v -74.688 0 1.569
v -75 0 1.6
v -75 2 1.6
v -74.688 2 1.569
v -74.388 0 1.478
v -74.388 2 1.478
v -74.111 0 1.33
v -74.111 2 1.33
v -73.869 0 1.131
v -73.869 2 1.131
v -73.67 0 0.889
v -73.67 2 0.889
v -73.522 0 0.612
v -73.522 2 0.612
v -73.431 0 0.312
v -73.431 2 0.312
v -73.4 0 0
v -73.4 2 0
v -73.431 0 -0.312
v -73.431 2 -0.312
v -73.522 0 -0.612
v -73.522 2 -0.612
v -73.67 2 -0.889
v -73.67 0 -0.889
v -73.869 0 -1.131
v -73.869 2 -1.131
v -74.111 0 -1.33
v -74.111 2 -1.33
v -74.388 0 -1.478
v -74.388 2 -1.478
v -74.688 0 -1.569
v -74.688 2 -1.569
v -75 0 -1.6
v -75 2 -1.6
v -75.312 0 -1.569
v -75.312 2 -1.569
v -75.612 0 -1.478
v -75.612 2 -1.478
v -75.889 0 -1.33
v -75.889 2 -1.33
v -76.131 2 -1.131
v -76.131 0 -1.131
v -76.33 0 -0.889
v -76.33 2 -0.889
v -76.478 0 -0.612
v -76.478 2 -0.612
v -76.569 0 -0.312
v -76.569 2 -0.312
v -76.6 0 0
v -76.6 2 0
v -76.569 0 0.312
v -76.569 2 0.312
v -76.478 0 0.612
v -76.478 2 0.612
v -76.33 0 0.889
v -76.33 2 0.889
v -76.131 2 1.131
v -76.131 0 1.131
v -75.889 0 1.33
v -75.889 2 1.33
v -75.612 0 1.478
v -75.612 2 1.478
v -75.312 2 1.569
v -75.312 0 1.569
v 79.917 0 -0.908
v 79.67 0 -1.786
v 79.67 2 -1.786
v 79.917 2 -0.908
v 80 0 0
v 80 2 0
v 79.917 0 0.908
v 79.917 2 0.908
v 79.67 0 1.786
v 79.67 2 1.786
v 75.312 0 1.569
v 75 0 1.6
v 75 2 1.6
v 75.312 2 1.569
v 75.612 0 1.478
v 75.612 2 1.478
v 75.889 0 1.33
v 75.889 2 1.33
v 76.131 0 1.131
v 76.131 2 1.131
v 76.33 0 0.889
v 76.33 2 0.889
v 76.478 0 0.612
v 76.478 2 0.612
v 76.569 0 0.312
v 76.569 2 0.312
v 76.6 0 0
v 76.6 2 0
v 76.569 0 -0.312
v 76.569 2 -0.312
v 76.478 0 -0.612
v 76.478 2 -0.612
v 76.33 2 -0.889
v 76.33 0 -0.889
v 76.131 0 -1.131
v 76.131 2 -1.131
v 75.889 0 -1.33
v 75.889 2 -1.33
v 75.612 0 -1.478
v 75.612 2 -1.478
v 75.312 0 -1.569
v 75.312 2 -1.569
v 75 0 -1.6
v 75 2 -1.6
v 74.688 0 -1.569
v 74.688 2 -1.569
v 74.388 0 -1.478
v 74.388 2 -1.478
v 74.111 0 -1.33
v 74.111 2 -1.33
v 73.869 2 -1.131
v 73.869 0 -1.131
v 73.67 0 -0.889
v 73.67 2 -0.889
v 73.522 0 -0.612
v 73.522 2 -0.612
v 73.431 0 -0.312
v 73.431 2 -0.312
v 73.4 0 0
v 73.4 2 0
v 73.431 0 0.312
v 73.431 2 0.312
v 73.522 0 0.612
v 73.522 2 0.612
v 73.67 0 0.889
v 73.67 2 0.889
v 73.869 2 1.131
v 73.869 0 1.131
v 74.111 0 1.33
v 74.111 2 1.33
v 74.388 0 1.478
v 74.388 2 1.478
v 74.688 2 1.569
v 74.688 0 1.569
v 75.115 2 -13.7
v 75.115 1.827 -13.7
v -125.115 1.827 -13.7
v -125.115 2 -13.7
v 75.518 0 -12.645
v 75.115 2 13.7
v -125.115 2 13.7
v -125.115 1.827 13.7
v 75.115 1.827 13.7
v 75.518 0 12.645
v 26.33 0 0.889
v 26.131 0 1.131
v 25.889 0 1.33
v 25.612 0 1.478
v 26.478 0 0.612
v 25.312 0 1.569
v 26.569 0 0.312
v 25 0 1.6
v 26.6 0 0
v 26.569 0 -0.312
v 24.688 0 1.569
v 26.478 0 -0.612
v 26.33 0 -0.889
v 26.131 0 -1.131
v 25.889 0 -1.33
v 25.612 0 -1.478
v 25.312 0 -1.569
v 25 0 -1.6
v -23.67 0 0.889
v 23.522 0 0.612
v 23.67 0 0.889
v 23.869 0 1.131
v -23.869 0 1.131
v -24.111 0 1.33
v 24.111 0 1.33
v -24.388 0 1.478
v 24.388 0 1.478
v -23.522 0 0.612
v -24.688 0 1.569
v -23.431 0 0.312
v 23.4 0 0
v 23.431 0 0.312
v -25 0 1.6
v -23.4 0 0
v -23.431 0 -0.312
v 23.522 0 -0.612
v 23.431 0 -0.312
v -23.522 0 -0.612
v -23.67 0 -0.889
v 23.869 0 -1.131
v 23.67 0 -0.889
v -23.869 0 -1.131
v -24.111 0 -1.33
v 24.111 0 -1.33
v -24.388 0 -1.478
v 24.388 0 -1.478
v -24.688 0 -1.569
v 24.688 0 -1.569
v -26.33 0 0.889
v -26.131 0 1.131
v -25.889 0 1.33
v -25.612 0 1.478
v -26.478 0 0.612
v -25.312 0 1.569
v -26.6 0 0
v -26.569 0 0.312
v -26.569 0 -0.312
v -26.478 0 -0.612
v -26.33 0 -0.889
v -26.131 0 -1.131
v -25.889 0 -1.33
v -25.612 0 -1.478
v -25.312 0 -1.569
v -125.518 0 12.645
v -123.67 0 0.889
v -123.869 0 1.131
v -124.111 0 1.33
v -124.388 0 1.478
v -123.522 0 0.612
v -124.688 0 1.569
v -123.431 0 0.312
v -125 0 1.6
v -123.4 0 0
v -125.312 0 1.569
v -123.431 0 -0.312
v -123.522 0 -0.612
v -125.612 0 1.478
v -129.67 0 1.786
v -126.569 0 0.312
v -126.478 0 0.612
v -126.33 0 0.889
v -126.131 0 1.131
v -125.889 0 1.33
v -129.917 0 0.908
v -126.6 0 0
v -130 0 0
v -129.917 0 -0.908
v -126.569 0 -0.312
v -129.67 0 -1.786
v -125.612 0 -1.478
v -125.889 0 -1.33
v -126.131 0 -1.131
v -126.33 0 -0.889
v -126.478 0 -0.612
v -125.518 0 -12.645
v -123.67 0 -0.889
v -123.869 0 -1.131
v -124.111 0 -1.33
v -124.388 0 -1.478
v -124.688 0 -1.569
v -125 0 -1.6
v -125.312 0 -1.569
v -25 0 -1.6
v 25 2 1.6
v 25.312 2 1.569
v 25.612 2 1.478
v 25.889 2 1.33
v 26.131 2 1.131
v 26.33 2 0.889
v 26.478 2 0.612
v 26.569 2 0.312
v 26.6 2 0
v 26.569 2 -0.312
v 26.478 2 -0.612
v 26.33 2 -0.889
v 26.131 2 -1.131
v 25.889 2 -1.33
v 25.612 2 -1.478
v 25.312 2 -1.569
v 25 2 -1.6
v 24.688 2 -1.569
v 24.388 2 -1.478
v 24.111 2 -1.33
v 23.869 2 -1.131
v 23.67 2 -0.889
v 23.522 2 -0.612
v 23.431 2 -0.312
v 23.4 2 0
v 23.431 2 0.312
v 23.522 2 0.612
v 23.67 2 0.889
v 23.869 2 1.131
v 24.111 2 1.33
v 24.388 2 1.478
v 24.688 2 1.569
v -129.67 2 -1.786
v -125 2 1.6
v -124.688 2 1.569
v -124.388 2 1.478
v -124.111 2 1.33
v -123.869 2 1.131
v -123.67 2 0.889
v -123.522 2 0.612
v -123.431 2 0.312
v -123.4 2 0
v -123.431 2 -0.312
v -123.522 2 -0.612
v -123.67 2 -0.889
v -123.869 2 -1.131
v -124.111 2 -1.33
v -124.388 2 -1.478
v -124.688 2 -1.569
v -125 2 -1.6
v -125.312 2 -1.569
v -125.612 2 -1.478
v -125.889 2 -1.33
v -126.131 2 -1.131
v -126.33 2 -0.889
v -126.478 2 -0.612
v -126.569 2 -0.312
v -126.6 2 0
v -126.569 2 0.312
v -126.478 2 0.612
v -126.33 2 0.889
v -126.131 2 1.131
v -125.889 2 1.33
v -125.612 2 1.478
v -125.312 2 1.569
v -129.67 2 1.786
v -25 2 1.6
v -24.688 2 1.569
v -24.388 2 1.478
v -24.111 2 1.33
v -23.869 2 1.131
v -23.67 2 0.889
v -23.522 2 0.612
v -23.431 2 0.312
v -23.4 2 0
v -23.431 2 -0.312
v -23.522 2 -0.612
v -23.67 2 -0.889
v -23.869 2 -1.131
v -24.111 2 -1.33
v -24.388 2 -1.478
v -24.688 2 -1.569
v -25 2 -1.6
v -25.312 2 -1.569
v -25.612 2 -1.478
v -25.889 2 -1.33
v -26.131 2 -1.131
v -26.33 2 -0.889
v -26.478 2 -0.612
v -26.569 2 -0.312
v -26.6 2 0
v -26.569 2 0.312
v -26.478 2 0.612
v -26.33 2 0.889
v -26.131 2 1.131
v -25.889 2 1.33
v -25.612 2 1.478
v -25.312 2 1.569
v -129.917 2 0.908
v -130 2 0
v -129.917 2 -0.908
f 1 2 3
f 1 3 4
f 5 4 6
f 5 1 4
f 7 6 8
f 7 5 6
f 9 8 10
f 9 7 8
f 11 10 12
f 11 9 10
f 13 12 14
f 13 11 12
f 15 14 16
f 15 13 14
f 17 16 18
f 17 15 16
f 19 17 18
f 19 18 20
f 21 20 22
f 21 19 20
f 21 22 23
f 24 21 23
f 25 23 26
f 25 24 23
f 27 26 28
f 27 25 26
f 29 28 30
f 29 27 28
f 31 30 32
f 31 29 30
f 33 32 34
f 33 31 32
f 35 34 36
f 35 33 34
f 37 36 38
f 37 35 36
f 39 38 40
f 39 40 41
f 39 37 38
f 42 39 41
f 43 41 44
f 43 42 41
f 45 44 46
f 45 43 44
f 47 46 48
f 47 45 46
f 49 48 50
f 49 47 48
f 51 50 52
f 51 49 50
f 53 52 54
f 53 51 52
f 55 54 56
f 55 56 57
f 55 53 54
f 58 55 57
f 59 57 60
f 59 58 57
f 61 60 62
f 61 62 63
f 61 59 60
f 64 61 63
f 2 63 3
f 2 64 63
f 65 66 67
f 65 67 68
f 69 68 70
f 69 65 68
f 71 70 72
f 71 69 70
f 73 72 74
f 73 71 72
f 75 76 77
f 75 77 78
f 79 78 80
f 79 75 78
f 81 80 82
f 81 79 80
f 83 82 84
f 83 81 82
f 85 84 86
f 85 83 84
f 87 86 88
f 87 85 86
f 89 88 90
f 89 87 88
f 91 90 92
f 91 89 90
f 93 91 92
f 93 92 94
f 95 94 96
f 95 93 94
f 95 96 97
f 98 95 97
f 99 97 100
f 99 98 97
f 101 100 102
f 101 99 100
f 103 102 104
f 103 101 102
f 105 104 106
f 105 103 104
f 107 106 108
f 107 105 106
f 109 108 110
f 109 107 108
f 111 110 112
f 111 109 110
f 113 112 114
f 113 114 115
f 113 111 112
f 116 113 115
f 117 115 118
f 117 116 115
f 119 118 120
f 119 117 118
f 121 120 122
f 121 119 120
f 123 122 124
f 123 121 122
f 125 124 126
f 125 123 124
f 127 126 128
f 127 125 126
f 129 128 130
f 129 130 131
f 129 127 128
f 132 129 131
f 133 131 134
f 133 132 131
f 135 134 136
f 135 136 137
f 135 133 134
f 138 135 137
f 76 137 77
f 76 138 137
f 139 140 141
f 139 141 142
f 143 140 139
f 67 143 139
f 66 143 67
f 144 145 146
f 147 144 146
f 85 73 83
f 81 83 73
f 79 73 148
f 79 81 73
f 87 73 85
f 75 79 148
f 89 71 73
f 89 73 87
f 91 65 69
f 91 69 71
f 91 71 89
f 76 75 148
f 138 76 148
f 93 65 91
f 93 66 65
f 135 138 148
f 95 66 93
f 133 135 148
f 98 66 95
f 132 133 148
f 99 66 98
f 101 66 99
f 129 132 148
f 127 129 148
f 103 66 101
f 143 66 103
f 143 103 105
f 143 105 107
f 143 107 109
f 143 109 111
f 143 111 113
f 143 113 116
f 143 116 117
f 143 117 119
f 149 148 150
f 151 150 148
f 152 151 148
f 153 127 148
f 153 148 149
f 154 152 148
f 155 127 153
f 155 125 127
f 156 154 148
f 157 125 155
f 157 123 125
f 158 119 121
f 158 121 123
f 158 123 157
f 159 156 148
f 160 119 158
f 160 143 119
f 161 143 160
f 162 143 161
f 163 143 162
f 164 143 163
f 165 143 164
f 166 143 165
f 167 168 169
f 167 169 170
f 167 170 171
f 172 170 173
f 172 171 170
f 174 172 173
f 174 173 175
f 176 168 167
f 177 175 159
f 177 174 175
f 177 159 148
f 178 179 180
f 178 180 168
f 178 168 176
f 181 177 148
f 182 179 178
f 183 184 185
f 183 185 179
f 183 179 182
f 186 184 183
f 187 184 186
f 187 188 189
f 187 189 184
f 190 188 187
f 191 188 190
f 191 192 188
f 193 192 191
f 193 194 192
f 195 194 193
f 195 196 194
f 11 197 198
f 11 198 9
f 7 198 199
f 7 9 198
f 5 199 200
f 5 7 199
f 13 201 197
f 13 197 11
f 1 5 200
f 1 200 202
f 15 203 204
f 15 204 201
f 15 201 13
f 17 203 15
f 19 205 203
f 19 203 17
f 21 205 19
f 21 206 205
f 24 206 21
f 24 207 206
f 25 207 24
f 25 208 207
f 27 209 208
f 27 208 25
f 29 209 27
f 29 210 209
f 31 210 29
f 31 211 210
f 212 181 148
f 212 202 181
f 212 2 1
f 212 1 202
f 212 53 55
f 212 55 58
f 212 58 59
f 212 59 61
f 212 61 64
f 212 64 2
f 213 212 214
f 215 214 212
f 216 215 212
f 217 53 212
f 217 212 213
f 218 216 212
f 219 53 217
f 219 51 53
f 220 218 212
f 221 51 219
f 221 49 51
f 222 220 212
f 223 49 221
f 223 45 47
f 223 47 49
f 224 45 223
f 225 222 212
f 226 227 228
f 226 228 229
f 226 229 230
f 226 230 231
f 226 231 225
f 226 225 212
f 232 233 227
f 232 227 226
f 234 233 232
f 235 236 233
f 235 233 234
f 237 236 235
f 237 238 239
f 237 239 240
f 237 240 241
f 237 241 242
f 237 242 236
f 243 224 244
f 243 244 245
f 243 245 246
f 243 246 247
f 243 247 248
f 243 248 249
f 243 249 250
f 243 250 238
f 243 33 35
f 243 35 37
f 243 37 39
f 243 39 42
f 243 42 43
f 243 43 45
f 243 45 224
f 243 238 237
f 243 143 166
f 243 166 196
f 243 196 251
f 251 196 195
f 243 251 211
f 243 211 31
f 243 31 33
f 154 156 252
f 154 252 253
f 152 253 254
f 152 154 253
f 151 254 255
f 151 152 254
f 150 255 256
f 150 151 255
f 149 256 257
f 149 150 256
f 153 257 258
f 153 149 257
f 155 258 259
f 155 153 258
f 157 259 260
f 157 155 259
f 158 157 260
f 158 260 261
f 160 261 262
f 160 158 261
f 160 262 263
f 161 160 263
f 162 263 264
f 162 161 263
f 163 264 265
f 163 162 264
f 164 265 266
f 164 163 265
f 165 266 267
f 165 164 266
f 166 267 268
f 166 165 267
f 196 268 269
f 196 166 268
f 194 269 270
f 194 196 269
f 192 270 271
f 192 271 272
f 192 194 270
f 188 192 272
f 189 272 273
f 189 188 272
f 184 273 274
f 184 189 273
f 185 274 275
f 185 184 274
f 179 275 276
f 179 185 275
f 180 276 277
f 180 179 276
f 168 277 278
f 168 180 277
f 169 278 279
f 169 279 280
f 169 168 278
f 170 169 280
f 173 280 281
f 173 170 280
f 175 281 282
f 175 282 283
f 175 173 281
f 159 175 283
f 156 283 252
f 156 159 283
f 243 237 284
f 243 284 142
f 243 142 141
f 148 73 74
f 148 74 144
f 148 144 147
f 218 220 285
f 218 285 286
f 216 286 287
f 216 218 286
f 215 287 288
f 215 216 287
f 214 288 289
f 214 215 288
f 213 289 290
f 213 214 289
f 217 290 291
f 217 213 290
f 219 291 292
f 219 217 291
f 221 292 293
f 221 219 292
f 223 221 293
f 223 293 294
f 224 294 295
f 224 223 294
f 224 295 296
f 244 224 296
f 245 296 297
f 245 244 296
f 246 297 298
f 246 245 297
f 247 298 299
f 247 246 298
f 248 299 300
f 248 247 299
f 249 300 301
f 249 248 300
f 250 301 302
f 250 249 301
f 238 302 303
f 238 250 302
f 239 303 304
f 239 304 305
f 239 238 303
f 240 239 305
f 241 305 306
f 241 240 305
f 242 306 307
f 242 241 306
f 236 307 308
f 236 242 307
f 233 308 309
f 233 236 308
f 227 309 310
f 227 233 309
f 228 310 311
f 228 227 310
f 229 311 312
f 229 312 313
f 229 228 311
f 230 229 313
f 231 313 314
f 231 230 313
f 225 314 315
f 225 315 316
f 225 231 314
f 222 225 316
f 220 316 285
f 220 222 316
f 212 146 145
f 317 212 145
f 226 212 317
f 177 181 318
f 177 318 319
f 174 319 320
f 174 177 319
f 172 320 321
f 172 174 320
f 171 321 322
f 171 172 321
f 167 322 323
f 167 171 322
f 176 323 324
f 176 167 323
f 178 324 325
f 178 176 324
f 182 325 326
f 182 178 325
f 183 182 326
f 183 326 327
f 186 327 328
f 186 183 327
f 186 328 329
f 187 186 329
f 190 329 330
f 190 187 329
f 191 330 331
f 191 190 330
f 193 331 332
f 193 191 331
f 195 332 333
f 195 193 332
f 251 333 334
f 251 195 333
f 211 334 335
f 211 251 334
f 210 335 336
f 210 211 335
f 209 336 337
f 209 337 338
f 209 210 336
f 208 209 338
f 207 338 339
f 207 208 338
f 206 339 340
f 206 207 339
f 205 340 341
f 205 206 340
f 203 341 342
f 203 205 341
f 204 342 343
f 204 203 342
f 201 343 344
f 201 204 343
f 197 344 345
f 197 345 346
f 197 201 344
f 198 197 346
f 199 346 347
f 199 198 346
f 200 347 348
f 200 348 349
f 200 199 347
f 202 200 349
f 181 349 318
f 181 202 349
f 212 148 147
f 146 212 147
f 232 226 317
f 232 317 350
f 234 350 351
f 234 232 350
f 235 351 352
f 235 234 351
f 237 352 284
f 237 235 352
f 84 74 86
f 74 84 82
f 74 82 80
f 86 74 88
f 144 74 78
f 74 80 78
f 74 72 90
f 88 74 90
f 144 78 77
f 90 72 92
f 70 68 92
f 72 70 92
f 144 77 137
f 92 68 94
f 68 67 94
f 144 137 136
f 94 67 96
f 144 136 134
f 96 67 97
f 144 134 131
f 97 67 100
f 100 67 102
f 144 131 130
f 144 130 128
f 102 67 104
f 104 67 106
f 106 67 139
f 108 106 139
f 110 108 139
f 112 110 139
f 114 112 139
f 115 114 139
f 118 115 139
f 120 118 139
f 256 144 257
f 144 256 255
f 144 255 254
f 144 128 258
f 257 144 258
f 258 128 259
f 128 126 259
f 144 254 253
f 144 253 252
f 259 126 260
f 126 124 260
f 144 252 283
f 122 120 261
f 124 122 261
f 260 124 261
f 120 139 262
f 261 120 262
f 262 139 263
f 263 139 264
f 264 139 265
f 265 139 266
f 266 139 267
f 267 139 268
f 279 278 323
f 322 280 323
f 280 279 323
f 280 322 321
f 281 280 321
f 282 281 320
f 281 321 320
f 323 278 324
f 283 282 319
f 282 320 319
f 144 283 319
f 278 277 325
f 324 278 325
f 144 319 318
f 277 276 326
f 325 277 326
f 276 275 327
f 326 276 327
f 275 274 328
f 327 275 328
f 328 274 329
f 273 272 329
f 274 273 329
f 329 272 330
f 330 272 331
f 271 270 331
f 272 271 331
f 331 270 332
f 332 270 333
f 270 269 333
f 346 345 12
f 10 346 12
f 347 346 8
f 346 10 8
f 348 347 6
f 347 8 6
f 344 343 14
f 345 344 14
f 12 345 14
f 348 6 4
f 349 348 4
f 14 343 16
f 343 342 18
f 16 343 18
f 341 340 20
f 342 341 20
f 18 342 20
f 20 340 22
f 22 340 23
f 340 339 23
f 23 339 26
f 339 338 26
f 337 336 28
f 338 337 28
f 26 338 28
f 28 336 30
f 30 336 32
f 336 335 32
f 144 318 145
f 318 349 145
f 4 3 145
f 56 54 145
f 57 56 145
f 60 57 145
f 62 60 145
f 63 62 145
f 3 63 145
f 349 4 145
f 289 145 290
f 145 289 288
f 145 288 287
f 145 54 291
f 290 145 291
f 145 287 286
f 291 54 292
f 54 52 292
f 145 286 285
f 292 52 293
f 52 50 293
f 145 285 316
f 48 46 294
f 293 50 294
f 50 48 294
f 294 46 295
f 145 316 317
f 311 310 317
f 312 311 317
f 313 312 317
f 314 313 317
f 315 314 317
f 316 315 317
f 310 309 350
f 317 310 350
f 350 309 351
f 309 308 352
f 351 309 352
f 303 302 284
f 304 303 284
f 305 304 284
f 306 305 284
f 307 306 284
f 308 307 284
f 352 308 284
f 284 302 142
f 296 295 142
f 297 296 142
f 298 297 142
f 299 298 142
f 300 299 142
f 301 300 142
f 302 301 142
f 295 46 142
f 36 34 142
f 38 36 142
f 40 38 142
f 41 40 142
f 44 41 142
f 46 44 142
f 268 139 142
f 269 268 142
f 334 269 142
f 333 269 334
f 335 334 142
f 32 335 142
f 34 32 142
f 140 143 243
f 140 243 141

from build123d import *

# Parameters (mm, degrees)
SKETCH_1_R               = 1.6
EXTRUDE_1_DEPTH          = 2
CUT_EXTRUDE_1_DEPTH      = 5
CUT_EXTRUDE_1_DEPTH_BACK = 210
CHAMFER_2_SIZE           = 0.2
CHAMFER_2_SIZE_2         = 0.1


with BuildPart() as part:
    # Эскиз1 → Бобышка-Вытянуть1 (new body)
    with BuildSketch(Plane(origin=(0, 0, 0), x_dir=(1, 0, 0), z_dir=(0, 1, 0))):
        with BuildLine():
            Line((-125, 14), (75, 14))
            Line((75, 14), (79.670248868, 1.785714286))
            ThreePointArc((79.670248868, 1.785714286), (80, 0), (79.670248868, -1.785714286))
            Line((79.670248868, -1.785714286), (75, -14))
            Line((75, -14), (-75, -14))
            Line((-75, -14), (-125, -14))
            Line((-125, -14), (-129.670248868, -1.785714286))
            ThreePointArc((-129.670248868, -1.785714286), (-130, 0), (-129.670248868, 1.785714286))
            Line((-129.670248868, 1.785714286), (-125, 14))
        make_face()
        with Locations(Location((-75, 0, 0), (0, 0, 270))):
            Circle(SKETCH_1_R, mode=Mode.SUBTRACT)
        with Locations(Location((75, 0, 0), (0, 0, 270))):
            Circle(SKETCH_1_R, mode=Mode.SUBTRACT)
        with Locations(Location((-25, 0, 0), (0, 0, 270))):
            Circle(SKETCH_1_R, mode=Mode.SUBTRACT)
        with Locations(Location((25, 0, 0), (0, 0, 270))):
            Circle(SKETCH_1_R, mode=Mode.SUBTRACT)
        with Locations(Location((-125, 0, 0), (0, 0, 270))):
            Circle(SKETCH_1_R, mode=Mode.SUBTRACT)
    extrude(amount=EXTRUDE_1_DEPTH)

    # Эскиз4 → Вырез-Вытянуть1 (cut, two sides: drawn at the far end of the back side and taken through both)
    with BuildSketch(Plane.ZY.offset(125).offset(-CUT_EXTRUDE_1_DEPTH_BACK)):
        Polygon((-14, 2), (-14, 0), (-12.645299462, 0), (-13.8, 2), align=None)
        Polygon((14, 2), (14, 0), (12.645299462, 0), (13.8, 2), align=None)
    extrude(amount=CUT_EXTRUDE_1_DEPTH + CUT_EXTRUDE_1_DEPTH_BACK, mode=Mode.SUBTRACT)

    # Фаска2
    # the kernel refuses this chamfer: 0.2, 0.1 mm, written as the material it takes off along each edge
    with BuildSketch(Plane(origin=(-125.593889062, 2, -13.8), x_dir=(0, -0.875527030904719, 0.48316914031751595), z_dir=(1, 0, 0))) as chamfer_2_piece_1:
        Polygon((CHAMFER_2_SIZE * 0.999813220622, -CHAMFER_2_SIZE * 0.0193267656127), (CHAMFER_2_SIZE_2 * 0.483169140318, -CHAMFER_2_SIZE_2 * 0.875527030905), (0, 0), align=None)
    extrude(amount=201.187778124, mode=Mode.SUBTRACT)
    with BuildSketch(Plane(origin=(75.593889062, 2, 13.8), x_dir=(1.1200704684646426e-15, 0.07974522228289034, -0.996815278536125), z_dir=(-1, 0, 0))) as chamfer_2_piece_2:
        Polygon((CHAMFER_2_SIZE_2 * 0.996815278536, CHAMFER_2_SIZE_2 * 0.0797452222829), (CHAMFER_2_SIZE * 0.429346250941, CHAMFER_2_SIZE * 0.903139965234), (0, 0), align=None)
    extrude(amount=201.187778124, mode=Mode.SUBTRACT)


solid = part.part
